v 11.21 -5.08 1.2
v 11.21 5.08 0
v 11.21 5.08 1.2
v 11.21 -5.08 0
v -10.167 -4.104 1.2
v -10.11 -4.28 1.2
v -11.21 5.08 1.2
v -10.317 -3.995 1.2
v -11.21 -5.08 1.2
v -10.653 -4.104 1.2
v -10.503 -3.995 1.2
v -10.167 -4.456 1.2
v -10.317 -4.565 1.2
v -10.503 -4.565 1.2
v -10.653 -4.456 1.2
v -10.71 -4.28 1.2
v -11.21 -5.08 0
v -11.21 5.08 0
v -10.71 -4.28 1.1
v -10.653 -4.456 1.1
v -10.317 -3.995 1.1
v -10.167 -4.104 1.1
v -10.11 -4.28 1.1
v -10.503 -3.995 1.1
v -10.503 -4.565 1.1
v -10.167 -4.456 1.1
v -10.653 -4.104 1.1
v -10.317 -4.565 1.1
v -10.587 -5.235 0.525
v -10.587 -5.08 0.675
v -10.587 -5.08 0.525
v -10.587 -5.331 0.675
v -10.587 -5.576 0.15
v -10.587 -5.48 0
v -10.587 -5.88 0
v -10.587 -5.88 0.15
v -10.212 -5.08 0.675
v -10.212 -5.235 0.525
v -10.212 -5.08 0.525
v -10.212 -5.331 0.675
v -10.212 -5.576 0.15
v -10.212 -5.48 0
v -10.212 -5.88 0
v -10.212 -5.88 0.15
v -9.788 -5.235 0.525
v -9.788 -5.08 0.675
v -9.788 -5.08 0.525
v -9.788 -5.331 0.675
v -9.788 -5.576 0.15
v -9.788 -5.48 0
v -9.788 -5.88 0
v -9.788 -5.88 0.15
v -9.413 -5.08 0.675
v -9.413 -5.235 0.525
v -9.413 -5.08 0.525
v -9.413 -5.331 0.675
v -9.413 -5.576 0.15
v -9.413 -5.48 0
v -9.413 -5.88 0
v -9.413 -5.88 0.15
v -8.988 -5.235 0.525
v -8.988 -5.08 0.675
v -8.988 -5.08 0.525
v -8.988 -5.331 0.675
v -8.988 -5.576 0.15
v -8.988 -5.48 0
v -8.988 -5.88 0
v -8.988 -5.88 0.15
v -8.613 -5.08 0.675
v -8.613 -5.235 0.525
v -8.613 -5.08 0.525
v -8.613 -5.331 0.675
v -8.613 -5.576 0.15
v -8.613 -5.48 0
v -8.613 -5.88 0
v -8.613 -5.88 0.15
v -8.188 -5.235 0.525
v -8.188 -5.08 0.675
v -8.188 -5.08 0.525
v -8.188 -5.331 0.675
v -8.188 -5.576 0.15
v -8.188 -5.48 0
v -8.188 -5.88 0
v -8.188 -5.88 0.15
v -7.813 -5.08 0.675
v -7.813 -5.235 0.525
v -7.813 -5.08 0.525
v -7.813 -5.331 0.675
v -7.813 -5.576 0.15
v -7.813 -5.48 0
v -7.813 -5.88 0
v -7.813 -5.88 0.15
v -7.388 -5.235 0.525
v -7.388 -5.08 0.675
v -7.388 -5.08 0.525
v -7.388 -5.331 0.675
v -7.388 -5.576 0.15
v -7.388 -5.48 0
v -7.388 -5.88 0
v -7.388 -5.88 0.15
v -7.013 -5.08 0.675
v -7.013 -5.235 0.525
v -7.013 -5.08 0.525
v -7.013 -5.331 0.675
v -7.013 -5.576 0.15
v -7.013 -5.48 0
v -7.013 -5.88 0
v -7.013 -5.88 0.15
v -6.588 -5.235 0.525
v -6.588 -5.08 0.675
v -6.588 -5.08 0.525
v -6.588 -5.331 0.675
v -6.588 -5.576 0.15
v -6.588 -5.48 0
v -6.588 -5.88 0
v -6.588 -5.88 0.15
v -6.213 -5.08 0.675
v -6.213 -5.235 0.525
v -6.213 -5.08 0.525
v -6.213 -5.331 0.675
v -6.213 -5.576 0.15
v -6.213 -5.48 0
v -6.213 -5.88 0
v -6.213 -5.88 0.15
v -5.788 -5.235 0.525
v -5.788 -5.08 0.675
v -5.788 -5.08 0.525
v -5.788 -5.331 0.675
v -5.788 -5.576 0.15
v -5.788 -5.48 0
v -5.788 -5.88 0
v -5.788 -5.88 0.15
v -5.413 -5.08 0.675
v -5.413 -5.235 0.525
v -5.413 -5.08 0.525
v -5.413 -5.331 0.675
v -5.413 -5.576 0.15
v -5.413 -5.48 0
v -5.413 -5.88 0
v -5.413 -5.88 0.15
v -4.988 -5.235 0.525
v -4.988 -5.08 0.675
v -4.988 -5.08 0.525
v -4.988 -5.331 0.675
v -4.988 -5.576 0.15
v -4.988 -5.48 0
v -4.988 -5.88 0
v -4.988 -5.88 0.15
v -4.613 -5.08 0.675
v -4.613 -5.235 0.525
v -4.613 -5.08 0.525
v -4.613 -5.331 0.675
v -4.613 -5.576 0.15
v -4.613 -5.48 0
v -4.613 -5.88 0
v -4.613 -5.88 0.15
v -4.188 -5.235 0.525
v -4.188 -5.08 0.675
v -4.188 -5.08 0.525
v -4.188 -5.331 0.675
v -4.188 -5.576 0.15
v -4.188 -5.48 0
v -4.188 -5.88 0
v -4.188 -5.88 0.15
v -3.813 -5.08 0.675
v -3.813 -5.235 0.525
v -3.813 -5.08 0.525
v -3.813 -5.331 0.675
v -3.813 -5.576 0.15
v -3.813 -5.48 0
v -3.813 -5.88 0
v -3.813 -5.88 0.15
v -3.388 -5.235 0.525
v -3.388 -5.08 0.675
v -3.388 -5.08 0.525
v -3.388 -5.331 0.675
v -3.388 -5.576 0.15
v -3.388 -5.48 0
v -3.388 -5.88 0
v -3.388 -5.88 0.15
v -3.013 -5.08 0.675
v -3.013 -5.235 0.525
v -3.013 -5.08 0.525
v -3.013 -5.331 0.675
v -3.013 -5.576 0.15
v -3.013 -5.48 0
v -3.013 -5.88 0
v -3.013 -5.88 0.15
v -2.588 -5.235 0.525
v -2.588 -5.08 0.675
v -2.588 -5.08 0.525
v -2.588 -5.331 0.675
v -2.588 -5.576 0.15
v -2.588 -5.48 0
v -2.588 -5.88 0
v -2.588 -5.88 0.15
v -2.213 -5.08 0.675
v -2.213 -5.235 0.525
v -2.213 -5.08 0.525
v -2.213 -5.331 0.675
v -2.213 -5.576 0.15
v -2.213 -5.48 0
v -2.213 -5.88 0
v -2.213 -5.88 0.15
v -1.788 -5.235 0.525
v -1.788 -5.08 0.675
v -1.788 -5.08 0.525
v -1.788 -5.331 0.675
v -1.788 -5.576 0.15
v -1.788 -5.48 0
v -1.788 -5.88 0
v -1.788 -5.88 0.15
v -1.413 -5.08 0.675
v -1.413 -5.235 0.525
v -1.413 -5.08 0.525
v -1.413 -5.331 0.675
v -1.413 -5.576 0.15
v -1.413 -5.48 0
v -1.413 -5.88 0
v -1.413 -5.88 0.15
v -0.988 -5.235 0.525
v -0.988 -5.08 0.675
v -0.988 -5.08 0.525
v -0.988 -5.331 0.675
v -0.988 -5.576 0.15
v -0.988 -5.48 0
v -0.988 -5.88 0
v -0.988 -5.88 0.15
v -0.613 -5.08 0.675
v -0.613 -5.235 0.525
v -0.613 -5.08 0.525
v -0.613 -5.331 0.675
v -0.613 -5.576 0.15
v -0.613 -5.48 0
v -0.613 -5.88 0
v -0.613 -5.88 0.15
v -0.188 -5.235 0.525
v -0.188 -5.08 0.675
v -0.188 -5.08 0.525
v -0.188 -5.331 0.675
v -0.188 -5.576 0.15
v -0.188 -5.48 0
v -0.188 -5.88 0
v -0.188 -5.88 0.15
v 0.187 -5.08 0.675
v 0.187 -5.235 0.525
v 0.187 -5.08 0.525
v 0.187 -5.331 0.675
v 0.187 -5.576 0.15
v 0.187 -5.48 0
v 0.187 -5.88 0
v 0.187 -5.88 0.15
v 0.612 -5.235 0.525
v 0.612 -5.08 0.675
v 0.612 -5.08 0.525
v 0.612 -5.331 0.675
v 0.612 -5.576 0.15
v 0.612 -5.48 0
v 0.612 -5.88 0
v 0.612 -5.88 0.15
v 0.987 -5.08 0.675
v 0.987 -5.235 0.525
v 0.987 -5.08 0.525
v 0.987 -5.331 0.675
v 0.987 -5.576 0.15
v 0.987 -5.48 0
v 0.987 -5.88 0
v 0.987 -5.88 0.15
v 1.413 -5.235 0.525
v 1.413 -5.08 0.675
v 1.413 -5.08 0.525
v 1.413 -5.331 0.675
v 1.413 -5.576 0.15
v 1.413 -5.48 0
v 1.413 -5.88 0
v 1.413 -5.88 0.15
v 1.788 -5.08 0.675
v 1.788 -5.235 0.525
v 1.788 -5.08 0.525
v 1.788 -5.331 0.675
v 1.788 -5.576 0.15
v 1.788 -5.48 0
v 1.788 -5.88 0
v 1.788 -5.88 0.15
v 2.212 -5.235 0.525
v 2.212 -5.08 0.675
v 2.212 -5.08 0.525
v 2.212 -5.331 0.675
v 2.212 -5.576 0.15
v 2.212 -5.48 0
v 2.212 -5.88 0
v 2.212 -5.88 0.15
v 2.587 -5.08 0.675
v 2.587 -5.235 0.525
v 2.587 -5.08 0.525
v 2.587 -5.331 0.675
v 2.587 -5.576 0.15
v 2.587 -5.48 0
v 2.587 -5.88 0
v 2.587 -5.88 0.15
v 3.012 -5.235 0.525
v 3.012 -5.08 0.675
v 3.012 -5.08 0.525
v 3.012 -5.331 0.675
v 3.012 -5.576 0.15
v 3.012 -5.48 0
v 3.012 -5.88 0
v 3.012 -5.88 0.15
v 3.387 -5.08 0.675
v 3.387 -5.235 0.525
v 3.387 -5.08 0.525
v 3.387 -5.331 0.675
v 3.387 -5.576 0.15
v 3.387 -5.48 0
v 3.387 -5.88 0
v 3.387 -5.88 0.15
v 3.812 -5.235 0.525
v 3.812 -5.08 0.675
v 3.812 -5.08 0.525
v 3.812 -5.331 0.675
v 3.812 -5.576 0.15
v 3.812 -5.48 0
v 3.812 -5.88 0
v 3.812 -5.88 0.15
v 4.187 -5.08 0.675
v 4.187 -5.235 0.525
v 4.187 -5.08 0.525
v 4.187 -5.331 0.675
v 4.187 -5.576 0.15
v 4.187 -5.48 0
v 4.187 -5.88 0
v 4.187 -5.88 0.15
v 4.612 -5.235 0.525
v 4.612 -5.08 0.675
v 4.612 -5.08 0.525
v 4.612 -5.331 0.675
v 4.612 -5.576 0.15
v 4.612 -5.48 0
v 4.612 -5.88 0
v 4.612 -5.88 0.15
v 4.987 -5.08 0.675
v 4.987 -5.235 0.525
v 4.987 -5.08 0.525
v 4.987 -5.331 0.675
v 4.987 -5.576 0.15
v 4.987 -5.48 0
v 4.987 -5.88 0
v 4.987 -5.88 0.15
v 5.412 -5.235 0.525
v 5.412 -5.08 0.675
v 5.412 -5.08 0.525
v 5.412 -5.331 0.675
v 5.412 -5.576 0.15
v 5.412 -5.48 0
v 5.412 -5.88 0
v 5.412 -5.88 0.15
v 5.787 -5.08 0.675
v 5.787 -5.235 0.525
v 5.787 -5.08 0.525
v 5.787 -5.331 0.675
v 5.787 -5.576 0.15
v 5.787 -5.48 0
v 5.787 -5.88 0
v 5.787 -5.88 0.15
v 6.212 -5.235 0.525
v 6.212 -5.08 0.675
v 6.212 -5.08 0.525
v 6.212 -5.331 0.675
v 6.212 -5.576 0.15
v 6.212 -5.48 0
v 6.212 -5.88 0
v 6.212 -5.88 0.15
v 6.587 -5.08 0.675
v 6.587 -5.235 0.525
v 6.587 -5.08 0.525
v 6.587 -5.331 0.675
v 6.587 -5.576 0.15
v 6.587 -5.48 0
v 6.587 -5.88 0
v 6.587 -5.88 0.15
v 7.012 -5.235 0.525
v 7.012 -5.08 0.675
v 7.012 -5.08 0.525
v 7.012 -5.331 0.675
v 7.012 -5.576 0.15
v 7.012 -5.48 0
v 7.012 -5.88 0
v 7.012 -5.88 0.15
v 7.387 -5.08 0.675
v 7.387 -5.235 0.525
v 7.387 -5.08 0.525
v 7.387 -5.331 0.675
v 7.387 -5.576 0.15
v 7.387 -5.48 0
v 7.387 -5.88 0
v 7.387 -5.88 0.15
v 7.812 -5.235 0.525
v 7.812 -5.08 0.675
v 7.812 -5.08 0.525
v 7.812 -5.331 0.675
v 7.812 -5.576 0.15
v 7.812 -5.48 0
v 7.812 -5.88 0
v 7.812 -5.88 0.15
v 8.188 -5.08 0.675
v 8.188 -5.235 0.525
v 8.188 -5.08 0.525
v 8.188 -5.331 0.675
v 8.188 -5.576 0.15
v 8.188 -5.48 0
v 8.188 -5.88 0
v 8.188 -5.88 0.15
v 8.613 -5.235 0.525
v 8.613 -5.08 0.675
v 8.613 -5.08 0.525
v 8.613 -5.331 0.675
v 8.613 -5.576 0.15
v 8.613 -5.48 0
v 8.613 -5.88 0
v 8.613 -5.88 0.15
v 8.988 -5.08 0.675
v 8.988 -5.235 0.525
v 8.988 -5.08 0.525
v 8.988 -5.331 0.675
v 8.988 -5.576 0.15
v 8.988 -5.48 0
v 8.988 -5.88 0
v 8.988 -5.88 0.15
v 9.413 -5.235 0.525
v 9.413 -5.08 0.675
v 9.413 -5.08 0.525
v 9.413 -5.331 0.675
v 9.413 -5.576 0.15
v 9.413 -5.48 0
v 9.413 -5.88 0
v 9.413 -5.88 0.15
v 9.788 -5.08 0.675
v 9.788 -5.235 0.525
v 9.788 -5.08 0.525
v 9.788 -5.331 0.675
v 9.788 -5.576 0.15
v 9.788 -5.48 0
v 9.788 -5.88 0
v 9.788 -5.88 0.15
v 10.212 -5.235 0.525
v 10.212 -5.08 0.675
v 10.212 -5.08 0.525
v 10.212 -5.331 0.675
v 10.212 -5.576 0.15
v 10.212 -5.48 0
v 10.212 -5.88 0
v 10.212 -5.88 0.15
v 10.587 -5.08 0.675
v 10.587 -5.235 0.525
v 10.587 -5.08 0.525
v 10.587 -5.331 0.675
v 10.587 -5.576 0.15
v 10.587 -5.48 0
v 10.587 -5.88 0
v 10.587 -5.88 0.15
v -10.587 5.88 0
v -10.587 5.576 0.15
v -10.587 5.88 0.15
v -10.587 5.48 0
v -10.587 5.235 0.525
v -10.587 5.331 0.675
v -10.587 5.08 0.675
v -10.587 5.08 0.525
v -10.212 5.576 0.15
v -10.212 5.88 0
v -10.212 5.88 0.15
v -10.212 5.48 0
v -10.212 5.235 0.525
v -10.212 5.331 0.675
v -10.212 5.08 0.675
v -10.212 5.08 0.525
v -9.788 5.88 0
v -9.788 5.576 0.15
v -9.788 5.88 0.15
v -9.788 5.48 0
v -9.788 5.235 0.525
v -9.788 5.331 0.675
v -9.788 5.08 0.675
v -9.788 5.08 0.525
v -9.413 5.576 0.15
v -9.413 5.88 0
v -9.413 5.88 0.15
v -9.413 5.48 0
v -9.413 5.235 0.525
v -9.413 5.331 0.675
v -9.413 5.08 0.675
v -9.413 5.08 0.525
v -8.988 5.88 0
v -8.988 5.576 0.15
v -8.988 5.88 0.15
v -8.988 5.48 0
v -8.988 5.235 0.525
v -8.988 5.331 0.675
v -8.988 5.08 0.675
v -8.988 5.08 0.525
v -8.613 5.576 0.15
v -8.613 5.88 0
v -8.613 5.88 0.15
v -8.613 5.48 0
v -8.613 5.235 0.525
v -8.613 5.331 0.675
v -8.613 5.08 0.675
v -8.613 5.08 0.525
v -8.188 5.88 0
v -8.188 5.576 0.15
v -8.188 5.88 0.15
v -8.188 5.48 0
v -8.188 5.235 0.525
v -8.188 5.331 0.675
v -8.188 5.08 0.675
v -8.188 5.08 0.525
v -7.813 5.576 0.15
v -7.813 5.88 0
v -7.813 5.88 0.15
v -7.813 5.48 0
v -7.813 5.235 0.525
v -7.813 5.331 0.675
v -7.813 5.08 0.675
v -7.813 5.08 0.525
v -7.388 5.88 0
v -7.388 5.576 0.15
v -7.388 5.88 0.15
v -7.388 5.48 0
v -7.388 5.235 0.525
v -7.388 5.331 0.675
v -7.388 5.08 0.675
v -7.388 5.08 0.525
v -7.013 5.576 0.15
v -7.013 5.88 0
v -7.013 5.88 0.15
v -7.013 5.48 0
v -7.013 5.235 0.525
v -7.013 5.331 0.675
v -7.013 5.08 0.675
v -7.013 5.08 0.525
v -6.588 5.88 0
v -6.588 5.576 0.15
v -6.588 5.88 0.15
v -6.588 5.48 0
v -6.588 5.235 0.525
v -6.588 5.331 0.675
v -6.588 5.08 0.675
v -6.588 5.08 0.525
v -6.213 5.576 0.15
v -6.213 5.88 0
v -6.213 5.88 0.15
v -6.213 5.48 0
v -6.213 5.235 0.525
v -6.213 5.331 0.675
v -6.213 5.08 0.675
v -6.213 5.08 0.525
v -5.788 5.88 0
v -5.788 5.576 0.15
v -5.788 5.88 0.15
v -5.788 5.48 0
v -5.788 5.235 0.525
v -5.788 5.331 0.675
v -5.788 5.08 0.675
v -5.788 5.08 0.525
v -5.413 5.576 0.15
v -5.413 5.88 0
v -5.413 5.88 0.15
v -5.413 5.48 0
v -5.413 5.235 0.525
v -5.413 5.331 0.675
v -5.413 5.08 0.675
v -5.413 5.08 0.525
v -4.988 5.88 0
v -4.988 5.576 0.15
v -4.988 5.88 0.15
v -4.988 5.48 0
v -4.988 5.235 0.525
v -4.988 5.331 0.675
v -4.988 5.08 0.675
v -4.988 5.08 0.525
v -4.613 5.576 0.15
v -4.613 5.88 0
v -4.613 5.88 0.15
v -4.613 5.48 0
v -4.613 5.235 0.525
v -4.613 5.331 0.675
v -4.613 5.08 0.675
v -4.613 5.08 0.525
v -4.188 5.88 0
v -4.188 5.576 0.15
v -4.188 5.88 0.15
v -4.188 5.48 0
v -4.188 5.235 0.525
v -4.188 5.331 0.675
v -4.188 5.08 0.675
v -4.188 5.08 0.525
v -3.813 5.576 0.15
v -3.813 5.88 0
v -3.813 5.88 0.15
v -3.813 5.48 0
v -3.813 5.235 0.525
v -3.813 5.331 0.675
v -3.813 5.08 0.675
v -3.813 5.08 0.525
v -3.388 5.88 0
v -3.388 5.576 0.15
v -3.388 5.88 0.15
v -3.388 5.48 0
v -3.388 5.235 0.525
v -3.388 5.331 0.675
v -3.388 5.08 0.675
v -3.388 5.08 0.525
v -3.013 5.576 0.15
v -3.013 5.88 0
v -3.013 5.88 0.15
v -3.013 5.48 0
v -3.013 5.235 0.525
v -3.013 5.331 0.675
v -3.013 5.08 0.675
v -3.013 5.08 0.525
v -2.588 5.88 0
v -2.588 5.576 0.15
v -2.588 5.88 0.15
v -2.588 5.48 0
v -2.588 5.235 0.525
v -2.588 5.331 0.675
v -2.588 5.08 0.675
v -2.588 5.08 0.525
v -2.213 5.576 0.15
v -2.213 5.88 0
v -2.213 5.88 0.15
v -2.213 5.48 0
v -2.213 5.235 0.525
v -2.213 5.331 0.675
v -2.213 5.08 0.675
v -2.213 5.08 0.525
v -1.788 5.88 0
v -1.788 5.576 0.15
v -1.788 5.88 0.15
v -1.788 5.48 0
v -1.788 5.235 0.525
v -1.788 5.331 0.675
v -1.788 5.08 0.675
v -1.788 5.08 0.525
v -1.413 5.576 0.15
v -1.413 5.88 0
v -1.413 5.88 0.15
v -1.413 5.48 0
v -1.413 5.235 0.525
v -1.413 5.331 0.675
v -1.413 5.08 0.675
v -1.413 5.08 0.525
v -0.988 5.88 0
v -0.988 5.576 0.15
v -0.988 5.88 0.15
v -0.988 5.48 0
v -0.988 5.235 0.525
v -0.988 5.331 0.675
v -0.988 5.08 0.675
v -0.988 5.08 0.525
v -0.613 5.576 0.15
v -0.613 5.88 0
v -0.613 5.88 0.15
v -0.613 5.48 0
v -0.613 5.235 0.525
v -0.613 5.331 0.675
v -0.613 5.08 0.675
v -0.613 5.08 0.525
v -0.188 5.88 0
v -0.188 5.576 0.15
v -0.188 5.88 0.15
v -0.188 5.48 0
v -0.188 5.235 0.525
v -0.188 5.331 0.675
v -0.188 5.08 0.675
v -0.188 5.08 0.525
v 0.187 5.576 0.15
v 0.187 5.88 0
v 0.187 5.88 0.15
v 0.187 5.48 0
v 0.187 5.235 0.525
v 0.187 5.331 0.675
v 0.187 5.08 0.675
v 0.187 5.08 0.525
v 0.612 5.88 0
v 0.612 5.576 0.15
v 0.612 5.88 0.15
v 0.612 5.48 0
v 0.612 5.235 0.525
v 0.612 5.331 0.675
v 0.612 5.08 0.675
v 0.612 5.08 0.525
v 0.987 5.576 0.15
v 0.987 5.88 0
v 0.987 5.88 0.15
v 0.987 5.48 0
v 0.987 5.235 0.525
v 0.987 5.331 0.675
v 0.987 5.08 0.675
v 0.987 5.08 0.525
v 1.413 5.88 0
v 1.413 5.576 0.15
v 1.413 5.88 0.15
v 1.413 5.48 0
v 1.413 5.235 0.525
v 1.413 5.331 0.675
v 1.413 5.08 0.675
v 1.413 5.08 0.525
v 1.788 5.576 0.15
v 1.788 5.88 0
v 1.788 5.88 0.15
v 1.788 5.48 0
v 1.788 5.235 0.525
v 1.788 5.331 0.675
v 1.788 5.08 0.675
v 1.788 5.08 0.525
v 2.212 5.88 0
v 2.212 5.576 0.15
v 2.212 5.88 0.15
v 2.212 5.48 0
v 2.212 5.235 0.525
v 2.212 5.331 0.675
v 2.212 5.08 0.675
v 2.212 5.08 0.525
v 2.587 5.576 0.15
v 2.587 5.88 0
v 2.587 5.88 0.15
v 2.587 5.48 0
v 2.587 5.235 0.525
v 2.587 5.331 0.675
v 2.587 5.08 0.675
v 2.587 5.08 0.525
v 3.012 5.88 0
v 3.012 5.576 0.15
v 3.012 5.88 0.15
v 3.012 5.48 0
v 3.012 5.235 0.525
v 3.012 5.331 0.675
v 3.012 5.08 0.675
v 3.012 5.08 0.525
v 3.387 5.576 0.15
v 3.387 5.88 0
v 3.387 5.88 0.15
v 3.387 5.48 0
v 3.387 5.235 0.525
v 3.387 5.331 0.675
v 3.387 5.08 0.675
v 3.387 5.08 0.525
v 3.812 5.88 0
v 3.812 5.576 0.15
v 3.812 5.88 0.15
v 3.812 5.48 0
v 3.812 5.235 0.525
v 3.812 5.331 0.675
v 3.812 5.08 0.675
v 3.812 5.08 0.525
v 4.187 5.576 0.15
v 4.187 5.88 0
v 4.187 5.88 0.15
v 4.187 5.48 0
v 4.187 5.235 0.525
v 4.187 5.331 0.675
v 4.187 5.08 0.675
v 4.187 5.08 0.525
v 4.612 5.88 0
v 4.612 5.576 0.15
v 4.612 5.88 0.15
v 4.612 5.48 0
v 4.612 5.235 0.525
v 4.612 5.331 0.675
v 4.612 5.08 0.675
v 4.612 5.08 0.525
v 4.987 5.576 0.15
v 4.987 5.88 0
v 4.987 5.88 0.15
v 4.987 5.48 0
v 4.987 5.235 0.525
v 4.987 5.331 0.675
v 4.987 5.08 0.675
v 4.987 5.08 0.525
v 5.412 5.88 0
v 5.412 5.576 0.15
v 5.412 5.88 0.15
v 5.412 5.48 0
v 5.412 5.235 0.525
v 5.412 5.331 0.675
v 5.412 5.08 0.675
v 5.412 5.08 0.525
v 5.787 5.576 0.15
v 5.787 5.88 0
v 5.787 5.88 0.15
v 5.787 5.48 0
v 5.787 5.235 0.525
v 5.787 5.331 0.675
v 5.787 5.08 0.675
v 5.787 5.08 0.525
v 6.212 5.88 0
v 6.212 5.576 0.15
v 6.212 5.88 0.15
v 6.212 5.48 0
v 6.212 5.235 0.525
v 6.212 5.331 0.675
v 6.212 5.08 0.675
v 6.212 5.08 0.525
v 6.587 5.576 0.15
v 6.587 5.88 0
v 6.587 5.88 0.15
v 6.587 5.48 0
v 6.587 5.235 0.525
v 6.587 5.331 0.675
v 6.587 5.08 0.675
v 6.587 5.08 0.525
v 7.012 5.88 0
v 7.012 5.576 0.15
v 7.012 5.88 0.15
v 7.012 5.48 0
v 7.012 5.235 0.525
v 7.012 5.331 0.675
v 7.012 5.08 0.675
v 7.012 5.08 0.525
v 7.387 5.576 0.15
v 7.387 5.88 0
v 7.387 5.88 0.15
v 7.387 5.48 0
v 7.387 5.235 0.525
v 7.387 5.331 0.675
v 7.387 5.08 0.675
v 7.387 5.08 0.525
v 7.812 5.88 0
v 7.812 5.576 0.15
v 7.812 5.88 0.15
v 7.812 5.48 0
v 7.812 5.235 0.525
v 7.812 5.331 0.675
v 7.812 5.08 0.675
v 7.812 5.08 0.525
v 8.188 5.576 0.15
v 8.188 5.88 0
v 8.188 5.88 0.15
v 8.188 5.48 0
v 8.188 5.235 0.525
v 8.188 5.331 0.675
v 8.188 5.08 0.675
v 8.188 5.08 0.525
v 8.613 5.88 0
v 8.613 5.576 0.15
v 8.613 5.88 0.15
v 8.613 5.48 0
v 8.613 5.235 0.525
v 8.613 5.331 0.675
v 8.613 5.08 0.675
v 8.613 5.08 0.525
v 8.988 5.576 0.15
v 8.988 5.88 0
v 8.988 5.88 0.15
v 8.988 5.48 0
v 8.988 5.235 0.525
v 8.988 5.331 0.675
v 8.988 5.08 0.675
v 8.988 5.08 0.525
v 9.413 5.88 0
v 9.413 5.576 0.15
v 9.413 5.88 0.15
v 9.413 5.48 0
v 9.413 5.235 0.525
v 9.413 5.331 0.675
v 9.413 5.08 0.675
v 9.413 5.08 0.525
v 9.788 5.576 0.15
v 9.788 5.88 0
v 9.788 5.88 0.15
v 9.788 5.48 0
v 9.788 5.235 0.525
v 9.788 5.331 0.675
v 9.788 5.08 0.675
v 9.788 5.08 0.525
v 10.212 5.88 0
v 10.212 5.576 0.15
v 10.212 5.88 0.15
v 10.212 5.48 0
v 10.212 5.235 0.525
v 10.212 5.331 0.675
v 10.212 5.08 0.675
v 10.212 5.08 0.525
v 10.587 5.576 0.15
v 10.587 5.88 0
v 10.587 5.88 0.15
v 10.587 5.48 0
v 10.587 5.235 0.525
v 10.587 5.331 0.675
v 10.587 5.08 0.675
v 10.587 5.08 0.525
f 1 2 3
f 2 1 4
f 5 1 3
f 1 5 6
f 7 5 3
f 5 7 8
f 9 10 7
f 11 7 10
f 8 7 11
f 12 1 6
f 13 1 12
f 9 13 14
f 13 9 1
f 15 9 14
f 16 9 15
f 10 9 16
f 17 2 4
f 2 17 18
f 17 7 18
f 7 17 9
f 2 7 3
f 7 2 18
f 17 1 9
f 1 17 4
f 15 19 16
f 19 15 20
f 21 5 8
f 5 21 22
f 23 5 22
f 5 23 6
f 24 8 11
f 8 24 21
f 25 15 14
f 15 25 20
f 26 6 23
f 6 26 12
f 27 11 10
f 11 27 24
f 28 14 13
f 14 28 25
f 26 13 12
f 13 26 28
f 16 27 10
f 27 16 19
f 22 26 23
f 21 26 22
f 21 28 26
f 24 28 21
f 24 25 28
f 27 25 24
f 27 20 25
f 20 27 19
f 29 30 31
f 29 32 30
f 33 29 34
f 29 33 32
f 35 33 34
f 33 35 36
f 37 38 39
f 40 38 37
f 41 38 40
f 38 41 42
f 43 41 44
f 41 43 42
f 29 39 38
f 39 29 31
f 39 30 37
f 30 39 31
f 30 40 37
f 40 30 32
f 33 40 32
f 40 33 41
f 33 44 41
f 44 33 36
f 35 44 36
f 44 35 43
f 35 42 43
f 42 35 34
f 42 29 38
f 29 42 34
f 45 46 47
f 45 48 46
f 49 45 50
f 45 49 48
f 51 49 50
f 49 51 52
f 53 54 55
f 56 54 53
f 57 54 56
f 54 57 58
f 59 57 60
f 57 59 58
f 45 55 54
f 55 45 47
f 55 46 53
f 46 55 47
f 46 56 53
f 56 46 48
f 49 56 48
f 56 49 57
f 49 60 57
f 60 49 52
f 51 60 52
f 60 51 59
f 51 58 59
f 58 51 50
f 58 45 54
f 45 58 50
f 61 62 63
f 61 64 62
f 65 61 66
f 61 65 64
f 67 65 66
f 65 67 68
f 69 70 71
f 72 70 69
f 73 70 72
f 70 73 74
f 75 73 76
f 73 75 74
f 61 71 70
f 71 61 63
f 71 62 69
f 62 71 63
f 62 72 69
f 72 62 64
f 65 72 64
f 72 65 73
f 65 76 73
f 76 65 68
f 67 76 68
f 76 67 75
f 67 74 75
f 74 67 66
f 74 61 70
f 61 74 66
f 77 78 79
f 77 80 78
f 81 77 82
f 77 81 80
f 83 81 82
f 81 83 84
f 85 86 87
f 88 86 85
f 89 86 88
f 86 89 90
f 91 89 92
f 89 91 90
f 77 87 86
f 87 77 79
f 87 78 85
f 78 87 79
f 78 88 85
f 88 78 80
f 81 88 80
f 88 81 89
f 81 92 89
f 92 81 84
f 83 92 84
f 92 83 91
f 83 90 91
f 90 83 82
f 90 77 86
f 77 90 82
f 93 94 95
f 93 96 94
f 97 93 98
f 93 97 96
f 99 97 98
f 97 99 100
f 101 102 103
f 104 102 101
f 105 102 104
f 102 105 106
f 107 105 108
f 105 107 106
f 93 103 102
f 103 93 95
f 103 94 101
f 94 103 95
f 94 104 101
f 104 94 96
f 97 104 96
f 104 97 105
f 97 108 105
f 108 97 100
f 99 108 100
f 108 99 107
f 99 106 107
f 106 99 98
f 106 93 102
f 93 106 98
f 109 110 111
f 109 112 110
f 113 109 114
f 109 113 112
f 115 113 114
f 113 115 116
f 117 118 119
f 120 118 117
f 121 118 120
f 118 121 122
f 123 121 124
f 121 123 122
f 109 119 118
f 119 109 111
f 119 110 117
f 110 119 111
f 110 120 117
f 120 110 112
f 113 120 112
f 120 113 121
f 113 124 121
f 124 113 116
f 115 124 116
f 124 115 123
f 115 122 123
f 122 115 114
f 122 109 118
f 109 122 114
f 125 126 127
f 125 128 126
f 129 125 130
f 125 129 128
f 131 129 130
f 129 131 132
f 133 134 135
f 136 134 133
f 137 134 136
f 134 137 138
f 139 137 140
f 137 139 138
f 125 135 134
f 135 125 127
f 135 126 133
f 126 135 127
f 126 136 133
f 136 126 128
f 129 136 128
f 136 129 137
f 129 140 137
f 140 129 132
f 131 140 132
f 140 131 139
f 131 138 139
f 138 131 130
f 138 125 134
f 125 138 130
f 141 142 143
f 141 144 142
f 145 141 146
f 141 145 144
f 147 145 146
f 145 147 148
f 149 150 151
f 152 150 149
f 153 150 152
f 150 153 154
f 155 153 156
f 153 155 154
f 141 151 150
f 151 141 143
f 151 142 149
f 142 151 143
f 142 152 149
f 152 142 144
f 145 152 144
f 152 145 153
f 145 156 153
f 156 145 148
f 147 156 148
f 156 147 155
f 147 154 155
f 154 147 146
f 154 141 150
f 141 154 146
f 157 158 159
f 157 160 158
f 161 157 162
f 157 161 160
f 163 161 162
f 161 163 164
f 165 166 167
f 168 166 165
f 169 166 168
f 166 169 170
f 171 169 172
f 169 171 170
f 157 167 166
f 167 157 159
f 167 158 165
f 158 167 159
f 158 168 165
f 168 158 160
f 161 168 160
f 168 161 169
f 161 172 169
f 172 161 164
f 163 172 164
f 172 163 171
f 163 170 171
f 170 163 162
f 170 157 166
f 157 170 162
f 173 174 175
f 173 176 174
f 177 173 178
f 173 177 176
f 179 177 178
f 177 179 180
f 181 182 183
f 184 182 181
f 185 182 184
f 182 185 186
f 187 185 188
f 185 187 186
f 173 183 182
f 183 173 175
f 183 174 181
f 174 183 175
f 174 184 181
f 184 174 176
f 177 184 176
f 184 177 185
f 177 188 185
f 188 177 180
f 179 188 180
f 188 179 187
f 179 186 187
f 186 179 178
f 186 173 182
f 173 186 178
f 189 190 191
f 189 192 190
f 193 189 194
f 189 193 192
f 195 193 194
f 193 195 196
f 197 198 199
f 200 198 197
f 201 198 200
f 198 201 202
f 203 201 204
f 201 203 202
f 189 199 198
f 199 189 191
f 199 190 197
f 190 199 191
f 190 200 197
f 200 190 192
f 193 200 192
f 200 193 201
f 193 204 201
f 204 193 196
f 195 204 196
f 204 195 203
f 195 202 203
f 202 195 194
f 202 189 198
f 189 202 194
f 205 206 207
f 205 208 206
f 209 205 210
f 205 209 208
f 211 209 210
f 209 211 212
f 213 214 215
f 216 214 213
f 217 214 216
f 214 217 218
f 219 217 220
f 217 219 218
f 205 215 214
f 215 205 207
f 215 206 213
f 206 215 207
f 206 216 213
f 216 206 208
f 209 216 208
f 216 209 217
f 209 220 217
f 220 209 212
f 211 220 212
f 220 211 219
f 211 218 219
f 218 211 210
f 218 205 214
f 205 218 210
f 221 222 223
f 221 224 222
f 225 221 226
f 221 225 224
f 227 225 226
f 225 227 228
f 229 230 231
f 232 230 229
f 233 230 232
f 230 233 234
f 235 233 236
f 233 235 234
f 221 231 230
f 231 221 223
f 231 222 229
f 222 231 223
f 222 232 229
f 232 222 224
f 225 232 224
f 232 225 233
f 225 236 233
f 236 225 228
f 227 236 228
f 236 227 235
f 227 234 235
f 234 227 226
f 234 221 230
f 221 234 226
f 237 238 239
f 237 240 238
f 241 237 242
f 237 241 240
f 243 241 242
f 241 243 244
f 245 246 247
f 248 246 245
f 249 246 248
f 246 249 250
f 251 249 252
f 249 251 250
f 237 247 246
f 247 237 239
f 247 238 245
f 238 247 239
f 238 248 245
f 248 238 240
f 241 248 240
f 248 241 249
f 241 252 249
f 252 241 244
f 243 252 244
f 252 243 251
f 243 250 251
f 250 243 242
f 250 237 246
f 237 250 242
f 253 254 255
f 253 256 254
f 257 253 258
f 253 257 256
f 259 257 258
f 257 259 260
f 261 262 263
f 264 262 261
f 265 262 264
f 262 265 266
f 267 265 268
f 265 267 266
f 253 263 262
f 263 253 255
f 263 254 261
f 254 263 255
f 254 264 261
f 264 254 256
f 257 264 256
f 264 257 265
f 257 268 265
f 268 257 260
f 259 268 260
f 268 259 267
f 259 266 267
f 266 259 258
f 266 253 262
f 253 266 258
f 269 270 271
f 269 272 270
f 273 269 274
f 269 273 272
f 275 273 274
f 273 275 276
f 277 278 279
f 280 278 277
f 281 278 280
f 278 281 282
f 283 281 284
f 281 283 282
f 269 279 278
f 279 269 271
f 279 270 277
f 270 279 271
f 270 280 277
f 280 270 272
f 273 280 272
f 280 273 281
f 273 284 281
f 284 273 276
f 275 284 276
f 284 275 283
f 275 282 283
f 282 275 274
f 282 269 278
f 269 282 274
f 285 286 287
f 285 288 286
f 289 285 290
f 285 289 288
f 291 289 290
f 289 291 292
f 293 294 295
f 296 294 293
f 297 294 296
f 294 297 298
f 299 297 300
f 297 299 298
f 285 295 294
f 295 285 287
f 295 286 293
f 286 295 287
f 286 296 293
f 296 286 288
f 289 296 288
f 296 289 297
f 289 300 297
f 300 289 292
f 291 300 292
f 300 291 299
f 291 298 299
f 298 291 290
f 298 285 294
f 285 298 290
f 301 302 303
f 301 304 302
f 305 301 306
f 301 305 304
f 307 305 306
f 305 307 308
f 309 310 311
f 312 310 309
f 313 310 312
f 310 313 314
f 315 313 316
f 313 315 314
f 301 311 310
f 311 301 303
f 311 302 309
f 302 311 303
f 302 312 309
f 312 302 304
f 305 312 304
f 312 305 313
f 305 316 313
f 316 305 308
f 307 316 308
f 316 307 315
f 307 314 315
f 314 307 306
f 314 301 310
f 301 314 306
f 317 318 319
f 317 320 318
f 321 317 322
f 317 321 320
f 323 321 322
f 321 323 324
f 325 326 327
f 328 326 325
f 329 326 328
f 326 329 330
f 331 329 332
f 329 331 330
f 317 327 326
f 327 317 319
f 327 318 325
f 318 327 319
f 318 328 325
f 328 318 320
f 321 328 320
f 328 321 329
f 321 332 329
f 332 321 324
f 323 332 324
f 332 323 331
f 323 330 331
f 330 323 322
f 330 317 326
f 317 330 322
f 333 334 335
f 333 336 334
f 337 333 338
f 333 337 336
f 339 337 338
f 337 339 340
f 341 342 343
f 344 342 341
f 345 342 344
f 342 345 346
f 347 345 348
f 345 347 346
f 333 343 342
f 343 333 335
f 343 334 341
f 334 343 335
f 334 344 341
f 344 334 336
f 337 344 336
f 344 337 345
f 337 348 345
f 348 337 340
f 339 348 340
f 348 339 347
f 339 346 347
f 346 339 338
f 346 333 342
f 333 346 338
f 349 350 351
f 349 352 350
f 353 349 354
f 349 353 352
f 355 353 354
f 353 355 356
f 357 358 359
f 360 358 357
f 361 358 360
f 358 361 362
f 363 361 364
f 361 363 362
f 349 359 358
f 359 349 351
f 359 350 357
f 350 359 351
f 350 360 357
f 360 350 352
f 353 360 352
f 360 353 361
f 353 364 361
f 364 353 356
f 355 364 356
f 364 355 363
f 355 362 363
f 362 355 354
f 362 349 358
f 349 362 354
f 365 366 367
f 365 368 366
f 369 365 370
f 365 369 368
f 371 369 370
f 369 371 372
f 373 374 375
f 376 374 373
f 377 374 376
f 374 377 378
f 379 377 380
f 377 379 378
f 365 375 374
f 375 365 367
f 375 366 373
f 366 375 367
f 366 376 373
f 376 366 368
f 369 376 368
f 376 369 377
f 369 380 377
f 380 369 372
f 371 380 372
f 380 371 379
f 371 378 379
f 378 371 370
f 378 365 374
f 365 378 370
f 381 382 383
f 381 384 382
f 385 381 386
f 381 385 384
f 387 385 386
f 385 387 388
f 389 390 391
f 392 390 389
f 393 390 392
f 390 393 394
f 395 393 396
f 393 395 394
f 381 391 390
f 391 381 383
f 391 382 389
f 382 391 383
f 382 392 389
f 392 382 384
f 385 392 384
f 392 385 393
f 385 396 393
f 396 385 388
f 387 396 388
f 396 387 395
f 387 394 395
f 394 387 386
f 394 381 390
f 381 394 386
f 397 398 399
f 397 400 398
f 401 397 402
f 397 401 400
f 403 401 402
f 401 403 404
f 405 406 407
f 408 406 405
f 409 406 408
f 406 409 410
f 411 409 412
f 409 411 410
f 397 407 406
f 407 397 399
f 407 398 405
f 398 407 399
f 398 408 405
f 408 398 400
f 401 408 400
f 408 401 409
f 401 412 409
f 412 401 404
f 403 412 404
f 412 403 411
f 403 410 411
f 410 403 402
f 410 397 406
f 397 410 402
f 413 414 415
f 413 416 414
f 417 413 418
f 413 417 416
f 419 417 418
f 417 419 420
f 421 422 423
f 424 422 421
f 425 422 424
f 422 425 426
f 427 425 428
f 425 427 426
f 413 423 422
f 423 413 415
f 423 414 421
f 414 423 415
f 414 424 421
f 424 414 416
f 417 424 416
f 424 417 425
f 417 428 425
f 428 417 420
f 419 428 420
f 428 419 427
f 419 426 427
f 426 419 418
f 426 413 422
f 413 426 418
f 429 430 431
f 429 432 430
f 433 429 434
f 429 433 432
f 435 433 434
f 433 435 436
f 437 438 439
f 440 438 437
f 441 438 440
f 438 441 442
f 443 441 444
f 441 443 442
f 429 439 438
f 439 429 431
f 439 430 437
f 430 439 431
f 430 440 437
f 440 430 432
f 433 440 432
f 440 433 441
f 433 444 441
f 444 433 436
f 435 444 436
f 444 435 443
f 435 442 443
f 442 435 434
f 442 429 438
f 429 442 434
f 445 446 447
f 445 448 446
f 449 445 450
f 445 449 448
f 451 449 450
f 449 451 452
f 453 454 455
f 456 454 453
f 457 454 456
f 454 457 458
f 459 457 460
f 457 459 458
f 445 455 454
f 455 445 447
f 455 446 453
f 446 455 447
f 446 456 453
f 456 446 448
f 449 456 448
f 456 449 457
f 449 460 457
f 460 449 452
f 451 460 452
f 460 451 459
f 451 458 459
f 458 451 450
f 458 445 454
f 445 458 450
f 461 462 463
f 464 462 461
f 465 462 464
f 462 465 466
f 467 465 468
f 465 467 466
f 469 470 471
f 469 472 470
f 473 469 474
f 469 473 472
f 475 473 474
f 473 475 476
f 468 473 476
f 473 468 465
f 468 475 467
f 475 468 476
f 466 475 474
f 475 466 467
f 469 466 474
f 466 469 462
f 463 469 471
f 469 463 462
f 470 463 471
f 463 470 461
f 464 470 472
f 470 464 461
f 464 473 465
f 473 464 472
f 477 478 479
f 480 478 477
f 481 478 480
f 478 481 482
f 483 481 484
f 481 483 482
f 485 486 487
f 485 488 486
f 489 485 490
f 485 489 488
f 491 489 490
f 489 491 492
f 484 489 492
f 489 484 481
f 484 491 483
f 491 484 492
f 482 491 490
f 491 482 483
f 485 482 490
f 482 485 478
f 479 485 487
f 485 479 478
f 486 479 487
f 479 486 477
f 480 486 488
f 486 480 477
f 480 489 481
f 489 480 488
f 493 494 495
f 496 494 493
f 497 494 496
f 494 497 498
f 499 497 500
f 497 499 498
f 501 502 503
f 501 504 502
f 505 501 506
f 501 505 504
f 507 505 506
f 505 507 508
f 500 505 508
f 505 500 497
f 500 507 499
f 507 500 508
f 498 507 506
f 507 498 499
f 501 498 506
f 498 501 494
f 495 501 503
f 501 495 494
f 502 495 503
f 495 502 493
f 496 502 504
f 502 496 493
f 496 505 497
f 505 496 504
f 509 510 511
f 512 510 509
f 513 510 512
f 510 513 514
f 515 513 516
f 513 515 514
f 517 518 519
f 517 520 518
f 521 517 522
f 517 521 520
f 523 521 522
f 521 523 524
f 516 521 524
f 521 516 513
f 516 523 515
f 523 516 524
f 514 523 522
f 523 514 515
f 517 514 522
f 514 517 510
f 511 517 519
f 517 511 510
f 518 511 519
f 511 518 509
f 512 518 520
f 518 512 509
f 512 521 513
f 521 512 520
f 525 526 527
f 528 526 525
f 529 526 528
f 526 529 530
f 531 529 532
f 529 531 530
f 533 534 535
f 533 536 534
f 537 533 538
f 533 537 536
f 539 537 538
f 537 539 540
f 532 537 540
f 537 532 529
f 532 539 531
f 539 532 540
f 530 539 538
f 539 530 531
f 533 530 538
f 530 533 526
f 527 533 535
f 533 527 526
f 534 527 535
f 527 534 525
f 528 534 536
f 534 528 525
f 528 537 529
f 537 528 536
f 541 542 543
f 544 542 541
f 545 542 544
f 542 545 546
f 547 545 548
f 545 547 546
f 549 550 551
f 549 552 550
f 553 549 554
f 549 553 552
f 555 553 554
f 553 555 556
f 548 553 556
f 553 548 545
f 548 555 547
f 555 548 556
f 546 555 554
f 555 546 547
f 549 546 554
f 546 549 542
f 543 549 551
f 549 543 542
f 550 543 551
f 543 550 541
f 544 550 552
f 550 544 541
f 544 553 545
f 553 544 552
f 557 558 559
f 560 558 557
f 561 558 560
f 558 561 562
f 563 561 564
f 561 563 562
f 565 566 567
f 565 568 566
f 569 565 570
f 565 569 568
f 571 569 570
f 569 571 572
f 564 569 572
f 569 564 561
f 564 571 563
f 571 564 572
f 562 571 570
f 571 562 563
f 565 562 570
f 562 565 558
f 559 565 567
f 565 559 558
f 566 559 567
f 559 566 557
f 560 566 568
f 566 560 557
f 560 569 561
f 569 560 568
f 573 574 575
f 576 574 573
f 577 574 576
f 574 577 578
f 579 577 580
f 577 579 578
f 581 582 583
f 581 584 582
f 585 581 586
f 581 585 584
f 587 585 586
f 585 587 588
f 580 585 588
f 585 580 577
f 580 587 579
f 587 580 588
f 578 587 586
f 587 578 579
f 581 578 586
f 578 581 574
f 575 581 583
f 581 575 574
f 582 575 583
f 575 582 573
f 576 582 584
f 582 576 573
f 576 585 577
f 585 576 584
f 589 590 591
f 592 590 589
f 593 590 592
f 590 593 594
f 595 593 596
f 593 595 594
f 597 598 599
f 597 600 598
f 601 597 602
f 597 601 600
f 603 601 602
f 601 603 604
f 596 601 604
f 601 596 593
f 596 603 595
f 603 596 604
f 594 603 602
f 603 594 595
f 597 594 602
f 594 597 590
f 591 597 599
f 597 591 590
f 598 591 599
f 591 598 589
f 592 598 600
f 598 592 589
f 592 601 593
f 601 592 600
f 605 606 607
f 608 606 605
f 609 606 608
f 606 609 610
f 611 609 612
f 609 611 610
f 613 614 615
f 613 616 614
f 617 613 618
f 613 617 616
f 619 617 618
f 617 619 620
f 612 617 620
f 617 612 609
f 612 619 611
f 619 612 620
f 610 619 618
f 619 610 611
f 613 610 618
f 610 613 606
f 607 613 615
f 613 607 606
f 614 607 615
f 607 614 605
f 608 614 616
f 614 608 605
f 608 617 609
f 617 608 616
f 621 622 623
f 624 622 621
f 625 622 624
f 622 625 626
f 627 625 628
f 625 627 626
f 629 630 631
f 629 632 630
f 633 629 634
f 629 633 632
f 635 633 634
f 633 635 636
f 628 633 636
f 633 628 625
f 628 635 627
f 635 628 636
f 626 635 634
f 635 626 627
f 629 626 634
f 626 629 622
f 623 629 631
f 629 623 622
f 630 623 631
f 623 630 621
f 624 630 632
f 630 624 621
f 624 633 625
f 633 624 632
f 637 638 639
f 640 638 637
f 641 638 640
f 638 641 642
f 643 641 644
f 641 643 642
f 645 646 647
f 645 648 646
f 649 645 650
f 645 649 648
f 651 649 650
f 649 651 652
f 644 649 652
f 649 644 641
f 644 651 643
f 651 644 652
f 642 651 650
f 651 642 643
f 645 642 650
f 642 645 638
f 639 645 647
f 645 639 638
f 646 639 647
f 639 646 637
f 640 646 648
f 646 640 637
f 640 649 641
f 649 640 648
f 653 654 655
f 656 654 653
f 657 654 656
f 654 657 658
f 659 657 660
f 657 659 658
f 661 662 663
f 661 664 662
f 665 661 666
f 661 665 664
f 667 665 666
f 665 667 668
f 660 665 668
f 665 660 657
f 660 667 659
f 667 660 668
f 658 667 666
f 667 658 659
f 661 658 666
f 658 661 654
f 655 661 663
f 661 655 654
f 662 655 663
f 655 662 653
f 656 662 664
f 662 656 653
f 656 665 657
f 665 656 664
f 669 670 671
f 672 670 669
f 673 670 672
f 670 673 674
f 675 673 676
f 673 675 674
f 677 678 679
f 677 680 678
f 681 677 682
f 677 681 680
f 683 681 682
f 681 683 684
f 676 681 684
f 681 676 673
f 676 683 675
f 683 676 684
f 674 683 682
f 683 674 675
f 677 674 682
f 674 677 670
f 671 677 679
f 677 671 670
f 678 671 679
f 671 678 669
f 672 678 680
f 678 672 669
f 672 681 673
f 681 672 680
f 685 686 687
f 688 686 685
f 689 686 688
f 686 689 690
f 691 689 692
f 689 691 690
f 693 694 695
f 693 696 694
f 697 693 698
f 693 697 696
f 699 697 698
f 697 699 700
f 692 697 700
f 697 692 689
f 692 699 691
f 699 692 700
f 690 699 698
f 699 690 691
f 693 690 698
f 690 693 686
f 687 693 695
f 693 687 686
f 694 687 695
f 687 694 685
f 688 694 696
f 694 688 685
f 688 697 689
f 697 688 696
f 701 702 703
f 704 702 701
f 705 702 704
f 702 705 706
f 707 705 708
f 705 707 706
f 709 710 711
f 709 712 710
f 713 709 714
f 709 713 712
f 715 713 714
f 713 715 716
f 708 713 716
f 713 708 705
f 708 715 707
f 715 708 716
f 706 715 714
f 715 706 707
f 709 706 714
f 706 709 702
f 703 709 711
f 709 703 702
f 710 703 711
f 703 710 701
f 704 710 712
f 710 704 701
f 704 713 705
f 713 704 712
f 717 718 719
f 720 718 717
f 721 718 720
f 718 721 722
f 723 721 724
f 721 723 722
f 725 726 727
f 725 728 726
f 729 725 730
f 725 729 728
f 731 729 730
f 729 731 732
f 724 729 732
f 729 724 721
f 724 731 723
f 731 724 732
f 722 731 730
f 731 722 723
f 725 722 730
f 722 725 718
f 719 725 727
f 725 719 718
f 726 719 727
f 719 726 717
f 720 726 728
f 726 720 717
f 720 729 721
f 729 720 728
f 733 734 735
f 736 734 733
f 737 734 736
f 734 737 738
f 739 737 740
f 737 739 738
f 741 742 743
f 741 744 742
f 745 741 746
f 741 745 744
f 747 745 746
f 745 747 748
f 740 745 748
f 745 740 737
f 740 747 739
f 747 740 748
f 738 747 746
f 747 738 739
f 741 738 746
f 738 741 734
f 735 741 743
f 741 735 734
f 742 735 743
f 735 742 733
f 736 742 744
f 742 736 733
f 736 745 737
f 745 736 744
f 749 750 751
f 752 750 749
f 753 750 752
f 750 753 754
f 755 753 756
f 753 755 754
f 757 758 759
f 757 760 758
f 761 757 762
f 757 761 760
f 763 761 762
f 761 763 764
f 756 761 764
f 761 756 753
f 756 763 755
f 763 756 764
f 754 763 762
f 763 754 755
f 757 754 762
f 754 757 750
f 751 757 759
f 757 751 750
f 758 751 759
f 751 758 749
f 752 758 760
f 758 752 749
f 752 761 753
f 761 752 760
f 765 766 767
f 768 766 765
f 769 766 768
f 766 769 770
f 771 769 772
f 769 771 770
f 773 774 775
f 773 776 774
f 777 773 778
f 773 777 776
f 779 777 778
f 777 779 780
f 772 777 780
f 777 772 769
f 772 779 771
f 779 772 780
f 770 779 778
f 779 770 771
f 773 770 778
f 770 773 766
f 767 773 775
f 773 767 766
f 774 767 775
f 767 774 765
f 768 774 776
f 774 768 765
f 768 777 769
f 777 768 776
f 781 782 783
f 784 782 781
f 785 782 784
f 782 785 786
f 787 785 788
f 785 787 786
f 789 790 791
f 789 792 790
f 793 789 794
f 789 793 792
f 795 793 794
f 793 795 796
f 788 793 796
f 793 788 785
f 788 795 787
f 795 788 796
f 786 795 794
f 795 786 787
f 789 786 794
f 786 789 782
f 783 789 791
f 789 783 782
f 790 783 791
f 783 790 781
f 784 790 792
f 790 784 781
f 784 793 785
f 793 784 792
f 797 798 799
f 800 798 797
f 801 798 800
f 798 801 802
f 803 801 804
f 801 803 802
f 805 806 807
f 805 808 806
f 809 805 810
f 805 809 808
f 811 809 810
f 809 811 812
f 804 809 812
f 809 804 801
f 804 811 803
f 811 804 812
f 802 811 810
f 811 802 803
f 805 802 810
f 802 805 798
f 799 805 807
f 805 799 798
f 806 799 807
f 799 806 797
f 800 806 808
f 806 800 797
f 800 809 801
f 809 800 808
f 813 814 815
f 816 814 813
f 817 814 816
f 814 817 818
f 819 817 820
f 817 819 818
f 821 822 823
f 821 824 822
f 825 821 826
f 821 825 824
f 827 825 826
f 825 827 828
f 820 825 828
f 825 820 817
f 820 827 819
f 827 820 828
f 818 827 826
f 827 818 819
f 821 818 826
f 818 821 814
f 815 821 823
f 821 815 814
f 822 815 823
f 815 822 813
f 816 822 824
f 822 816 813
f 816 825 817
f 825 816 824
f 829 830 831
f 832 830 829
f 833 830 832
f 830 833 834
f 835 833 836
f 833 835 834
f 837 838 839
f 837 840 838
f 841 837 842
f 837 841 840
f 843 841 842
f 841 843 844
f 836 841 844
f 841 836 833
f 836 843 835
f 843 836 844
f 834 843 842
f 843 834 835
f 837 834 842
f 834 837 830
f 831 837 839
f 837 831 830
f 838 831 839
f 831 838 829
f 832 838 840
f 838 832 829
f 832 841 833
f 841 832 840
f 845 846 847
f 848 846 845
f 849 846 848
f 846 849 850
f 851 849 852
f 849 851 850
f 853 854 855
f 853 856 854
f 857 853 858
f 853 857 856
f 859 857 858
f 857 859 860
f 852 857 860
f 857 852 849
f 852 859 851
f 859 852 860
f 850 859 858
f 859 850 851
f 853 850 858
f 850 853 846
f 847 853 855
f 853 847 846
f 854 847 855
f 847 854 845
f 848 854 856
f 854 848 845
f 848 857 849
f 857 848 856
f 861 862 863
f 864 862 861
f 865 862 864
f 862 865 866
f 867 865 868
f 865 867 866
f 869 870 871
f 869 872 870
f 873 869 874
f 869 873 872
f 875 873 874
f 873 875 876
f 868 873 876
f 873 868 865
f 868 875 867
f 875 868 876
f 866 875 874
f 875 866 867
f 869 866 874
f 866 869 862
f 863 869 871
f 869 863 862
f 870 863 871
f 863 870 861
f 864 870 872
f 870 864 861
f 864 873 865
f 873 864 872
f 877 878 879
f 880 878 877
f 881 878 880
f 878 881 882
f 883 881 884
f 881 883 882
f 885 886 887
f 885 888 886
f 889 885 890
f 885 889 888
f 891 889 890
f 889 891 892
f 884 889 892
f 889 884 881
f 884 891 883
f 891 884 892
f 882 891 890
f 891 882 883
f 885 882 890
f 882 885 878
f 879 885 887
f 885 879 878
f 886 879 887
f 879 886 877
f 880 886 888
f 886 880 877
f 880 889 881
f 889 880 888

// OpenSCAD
/*
Open freecad, select Workbench OpenSCAD
import file, save as freecad file.fcstd, close,
open freecad file.fcstd, select all (object becomes green),
export to VRML 2.0 (wrl file)
PCB->right click->3D shape
navigate to file.wrl, edit filename ./footprints/bla/bla.3dshapes/file.wrl
use XYZ 0.3937 scale and rotate Z=90
https://www.freecadweb.org/wiki/Import_OpenSCAD_code
*/

// Case dimensions
case_x=22.42;        // Case X dimension
case_y=10.16;        // Case Y dimension
case_z=1.2;        // Case Z dimension
dot_radius=0.3; // Notch radius
dot_depth=0.1;  // Notch depth
dot_off_x=0.5;  // Notch offset X
dot_off_y=0.5;  // Notch offset Y
color_case=[0.15,0.15,0.15]; // dark gray
color_dot=[1,1,1]; // white

// Pin arrays parameters
side1_pins = 27;
side2_pins = 0;
side3_pins = 27;
side4_pins = 0;
pin_distance =0.8;    // Pin step
color_pin=[1,1,1]; // white

// Pin parameters
pin_th = 0.15; // Thickness
pin_W = 0.375;  // Pin width
pin_L = 0.8;  // Total Length
pin_H = case_z/2+pin_th/2; // Pin height (from bottom to top)
pin_l = 0.4;  // Length of the bottom part
pin_a = 115;  // Bending angle

translate_to_center=[-(side1_pins-1)*pin_distance/2,-(case_y+pin_L*2)/2,0];

// Bended pin
// _L - whole pin length
// _l - length of bottom part
// _H - whole pin height
// _th - pin thickness
// _a - bending angle
// _W - pin width
module pin(_L,_l,_H,_th,_a,_W)
{
    // Internal variables
    _d1 = _th*sin(_a) / (1-cos(_a));
    _d2 = (_th-_H)*cos(_a) / sin(_a);

    rotate([90,0,90])
    // Extrude the following polygon
    linear_extrude(height = _W, center = true, convexity = 10, twist = 0)
        polygon([[0,0],
                 [_l,0],
                 [_l+_d2,_H-_th],
                 [_L,_H-_th],
                 [_L,_H],
                 [_l+_d2-_d1,_H],
                 [_l-_d1,_th],
                 [0,_th]]);
}

// Array of pins
// _cnt - number of pins
// _distance - distance between pin centres
module pins_array(_cnt, _distance)
{
    if (_cnt>0)
    color(color_pin)
    {
        for (_i = [0:_cnt-1])
        {
            translate([_distance*_i,0,0])
                pin(pin_L,pin_l,pin_H,pin_th,pin_a,pin_W);
        }
    }
}

// Simple case with notch
module case()
{
    difference()
    {
        translate([case_x/2,case_y/2,case_z/2])
        color(color_case)
          cube([case_x,case_y,case_z],center=true);
        translate([dot_radius+dot_off_x,dot_radius+dot_off_y,case_z])
          color(color_dot)
            cylinder(h=dot_depth*2, r = dot_radius, center= true, $fn = 10);
    }
}


// Complete model
// scale(1/2.54) // 1/2.54=0.3937 scale for Kicad
module ic()
{
  // Case
  translate([-(case_x-(side1_pins-1)*pin_distance)/2,pin_L,0]+translate_to_center)
      case();

  translate(translate_to_center)
  union()
  {
    // Top pins
    translate([(side1_pins-side3_pins)*pin_distance/2,case_y+pin_L*2,0])
        mirror([0,1,0])
            pins_array(side3_pins, pin_distance);

    // Bottom pins
    pins_array(side1_pins, pin_distance);

    // Left pins
    translate([-(case_x-(side1_pins-1)*pin_distance)/2 - pin_L,pin_L+case_y/2-(side4_pins-1)*pin_distance/2,0])
        mirror([1,0,0])
            rotate([0,0,90])
                pins_array(side4_pins, pin_distance);

    // Right pins
    translate([-(case_x-(side1_pins-1)*pin_distance)/2-pin_L+case_x+2*pin_L,pin_L+case_y/2-(side2_pins-1)*pin_distance/2,0])
        mirror([0,1,0])
            mirror([0,1,0])
                rotate([0,0,90])
                    pins_array(side2_pins, pin_distance);
    }
}

ic();
